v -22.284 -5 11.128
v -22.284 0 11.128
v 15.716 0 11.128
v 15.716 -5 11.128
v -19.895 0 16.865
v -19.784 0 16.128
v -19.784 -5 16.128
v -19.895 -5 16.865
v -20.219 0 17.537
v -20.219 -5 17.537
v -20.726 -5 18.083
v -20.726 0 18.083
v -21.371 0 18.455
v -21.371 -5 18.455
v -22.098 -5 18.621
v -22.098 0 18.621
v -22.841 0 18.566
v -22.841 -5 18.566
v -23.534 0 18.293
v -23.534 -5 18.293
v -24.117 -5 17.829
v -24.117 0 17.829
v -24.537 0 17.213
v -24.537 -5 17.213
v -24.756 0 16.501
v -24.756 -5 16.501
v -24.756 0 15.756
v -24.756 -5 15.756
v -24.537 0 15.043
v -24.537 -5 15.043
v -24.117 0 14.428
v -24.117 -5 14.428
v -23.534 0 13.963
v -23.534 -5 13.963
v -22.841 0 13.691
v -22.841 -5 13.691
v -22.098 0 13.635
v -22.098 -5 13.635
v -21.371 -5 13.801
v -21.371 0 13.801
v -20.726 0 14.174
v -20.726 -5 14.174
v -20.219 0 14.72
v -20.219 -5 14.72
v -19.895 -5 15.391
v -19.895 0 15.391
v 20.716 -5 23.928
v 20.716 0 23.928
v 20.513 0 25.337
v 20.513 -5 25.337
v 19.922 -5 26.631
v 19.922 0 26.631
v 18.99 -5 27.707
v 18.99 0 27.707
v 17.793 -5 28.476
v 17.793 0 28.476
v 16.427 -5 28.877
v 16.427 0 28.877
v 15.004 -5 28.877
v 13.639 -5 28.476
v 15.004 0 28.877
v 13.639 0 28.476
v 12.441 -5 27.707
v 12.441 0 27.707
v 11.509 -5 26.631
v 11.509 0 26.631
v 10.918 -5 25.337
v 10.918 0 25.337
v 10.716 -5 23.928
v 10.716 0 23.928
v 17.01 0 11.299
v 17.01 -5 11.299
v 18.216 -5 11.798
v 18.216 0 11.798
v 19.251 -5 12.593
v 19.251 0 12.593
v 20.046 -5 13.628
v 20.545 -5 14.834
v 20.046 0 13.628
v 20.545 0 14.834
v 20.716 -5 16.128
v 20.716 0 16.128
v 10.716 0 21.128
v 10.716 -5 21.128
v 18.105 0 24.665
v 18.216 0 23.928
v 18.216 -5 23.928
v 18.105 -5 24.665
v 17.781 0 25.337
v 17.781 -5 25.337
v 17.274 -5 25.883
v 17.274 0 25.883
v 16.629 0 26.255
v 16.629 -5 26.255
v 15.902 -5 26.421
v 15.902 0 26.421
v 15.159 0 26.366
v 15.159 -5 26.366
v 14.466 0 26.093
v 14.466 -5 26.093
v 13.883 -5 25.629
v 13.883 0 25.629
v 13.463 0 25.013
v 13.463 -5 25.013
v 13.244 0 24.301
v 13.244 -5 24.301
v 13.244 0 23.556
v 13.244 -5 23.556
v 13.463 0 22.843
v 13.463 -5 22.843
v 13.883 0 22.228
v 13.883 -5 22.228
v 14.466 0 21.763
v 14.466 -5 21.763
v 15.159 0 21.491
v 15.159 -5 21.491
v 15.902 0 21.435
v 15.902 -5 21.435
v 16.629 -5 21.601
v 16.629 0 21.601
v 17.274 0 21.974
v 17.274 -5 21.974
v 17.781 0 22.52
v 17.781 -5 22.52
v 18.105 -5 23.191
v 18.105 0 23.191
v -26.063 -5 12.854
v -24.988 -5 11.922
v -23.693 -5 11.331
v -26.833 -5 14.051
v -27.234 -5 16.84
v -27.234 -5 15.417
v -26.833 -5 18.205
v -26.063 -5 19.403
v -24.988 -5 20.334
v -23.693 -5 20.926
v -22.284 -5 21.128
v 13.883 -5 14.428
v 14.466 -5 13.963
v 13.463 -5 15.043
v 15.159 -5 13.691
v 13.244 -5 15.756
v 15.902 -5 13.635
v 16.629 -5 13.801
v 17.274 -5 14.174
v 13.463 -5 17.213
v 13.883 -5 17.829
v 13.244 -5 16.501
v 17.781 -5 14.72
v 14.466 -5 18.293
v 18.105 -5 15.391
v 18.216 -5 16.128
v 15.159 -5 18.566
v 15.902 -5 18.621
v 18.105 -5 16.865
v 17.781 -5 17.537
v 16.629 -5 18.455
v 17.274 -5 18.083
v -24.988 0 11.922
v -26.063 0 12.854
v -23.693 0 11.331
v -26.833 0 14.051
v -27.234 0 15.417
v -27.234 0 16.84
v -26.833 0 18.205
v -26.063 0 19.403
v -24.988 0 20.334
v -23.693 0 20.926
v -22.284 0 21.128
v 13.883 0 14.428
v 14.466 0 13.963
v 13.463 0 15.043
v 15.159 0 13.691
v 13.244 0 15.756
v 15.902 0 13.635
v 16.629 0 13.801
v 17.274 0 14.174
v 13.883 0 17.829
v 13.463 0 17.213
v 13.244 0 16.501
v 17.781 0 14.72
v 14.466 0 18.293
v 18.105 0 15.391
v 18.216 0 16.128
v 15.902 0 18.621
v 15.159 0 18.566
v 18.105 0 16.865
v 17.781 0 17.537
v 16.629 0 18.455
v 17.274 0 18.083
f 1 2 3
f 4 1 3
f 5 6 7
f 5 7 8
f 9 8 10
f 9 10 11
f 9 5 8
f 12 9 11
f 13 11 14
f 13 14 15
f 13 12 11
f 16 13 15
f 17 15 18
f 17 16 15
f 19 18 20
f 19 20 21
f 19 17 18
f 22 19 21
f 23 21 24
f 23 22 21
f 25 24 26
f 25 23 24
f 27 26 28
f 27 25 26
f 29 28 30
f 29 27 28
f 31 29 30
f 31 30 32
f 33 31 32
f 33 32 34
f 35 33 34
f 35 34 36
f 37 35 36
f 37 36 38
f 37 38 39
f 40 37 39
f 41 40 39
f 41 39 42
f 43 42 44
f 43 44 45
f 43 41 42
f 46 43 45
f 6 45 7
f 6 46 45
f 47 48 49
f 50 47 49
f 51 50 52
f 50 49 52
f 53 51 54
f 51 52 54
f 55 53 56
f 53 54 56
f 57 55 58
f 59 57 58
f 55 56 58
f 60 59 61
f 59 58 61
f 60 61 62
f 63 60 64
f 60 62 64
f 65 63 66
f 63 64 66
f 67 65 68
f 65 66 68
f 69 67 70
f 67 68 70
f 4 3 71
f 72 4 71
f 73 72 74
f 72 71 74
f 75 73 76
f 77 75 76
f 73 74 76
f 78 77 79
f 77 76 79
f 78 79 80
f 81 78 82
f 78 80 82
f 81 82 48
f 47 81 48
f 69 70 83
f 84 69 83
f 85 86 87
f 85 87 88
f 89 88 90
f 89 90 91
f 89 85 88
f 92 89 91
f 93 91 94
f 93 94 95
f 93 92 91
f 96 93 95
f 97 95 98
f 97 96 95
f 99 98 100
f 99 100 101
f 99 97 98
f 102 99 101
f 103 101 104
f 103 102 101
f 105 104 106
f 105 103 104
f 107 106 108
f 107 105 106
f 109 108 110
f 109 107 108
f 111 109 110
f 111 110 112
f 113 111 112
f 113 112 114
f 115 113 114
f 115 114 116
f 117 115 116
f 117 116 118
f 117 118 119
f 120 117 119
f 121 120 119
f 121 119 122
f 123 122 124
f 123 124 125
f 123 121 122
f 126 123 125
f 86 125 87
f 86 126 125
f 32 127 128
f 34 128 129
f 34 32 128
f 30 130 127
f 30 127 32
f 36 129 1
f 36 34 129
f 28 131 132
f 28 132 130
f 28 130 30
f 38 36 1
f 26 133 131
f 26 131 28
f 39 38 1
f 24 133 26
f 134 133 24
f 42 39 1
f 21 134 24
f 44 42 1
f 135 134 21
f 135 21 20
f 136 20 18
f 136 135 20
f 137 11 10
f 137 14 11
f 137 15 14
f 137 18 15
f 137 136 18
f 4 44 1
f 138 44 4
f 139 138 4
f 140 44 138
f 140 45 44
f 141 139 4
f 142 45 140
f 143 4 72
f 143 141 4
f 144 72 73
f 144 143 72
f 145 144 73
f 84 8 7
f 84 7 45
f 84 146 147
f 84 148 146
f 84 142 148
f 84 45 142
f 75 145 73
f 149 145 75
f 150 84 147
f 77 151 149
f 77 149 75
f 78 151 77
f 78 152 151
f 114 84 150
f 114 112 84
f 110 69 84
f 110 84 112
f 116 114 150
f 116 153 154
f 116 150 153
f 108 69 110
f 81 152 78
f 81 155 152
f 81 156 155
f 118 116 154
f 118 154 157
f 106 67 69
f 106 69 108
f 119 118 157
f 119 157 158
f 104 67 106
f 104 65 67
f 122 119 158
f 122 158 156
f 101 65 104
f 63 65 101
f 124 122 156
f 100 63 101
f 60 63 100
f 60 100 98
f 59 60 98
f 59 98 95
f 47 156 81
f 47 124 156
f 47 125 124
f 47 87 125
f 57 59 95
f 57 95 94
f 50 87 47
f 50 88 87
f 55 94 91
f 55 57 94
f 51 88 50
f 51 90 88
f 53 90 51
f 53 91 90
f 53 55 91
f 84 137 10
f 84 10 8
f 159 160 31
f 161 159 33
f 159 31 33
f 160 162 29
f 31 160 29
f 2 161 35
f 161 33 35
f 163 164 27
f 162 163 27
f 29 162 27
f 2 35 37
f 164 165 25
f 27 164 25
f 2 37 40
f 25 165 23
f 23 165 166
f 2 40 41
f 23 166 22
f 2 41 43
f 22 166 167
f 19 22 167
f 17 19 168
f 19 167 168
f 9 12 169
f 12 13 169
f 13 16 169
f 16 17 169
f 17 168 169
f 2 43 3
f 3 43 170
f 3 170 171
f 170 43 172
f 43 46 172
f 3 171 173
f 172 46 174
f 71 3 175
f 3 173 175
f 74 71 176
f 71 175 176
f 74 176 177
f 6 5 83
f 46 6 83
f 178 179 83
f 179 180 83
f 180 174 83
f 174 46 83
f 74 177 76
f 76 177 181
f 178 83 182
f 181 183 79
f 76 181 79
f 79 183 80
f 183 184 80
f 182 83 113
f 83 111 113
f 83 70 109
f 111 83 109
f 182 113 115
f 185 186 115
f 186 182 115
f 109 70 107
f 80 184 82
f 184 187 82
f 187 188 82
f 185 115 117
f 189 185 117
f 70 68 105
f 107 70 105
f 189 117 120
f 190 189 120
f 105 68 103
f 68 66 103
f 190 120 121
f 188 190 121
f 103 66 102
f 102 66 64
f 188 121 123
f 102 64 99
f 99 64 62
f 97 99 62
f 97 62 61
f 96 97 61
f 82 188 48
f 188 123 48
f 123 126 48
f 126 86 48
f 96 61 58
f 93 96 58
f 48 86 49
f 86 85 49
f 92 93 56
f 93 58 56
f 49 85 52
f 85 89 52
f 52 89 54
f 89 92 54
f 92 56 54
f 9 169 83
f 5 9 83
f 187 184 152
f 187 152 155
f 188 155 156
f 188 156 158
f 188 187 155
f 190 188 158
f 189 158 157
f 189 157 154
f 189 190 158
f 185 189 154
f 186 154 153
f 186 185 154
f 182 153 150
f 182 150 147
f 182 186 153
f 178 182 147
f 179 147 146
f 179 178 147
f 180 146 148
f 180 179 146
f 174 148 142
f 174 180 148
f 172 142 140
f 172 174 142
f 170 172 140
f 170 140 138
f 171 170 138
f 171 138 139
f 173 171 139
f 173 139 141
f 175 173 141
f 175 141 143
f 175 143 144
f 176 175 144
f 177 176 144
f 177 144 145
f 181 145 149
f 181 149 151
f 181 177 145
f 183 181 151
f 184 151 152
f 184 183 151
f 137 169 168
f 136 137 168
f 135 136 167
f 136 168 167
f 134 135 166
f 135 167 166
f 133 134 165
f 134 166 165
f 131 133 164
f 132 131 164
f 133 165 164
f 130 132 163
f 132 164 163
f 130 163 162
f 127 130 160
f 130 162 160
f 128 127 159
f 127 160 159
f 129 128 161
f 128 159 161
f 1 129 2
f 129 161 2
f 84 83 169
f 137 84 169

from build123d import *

# Parameters (mm, degrees)
F0_R     = 2.5
F1_DEPTH = 5


with BuildPart() as f1:
    # F0 (on Front) → F1 (new body)
    with BuildSketch(Plane.XZ):
        with BuildLine():
            Line((10.71558, 21.128206), (-22.28442, 21.128206))
            ThreePointArc((-22.28442, 21.128206), (-27.28442, 16.128206), (-22.28442, 11.128206))
            Line((-22.28442, 11.128206), (15.71558, 11.128206))
            ThreePointArc((15.71558, 11.128206), (19.251113, 12.592672), (20.71558, 16.128206))
            Line((20.71558, 16.128206), (20.71558, 23.928206))
            ThreePointArc((20.71558, 23.928206), (15.71558, 28.928206), (10.71558, 23.928206))
            Line((10.71558, 23.928206), (10.71558, 21.128206))
        make_face()
        with Locations((-22.28442, 16.128206)):
            Circle(F0_R, mode=Mode.SUBTRACT)
        with Locations((15.71558, 16.128206)):
            Circle(F0_R, mode=Mode.SUBTRACT)
        with Locations((15.71558, 23.928206)):
            Circle(F0_R, mode=Mode.SUBTRACT)
    extrude(amount=F1_DEPTH)


solid = f1.part
